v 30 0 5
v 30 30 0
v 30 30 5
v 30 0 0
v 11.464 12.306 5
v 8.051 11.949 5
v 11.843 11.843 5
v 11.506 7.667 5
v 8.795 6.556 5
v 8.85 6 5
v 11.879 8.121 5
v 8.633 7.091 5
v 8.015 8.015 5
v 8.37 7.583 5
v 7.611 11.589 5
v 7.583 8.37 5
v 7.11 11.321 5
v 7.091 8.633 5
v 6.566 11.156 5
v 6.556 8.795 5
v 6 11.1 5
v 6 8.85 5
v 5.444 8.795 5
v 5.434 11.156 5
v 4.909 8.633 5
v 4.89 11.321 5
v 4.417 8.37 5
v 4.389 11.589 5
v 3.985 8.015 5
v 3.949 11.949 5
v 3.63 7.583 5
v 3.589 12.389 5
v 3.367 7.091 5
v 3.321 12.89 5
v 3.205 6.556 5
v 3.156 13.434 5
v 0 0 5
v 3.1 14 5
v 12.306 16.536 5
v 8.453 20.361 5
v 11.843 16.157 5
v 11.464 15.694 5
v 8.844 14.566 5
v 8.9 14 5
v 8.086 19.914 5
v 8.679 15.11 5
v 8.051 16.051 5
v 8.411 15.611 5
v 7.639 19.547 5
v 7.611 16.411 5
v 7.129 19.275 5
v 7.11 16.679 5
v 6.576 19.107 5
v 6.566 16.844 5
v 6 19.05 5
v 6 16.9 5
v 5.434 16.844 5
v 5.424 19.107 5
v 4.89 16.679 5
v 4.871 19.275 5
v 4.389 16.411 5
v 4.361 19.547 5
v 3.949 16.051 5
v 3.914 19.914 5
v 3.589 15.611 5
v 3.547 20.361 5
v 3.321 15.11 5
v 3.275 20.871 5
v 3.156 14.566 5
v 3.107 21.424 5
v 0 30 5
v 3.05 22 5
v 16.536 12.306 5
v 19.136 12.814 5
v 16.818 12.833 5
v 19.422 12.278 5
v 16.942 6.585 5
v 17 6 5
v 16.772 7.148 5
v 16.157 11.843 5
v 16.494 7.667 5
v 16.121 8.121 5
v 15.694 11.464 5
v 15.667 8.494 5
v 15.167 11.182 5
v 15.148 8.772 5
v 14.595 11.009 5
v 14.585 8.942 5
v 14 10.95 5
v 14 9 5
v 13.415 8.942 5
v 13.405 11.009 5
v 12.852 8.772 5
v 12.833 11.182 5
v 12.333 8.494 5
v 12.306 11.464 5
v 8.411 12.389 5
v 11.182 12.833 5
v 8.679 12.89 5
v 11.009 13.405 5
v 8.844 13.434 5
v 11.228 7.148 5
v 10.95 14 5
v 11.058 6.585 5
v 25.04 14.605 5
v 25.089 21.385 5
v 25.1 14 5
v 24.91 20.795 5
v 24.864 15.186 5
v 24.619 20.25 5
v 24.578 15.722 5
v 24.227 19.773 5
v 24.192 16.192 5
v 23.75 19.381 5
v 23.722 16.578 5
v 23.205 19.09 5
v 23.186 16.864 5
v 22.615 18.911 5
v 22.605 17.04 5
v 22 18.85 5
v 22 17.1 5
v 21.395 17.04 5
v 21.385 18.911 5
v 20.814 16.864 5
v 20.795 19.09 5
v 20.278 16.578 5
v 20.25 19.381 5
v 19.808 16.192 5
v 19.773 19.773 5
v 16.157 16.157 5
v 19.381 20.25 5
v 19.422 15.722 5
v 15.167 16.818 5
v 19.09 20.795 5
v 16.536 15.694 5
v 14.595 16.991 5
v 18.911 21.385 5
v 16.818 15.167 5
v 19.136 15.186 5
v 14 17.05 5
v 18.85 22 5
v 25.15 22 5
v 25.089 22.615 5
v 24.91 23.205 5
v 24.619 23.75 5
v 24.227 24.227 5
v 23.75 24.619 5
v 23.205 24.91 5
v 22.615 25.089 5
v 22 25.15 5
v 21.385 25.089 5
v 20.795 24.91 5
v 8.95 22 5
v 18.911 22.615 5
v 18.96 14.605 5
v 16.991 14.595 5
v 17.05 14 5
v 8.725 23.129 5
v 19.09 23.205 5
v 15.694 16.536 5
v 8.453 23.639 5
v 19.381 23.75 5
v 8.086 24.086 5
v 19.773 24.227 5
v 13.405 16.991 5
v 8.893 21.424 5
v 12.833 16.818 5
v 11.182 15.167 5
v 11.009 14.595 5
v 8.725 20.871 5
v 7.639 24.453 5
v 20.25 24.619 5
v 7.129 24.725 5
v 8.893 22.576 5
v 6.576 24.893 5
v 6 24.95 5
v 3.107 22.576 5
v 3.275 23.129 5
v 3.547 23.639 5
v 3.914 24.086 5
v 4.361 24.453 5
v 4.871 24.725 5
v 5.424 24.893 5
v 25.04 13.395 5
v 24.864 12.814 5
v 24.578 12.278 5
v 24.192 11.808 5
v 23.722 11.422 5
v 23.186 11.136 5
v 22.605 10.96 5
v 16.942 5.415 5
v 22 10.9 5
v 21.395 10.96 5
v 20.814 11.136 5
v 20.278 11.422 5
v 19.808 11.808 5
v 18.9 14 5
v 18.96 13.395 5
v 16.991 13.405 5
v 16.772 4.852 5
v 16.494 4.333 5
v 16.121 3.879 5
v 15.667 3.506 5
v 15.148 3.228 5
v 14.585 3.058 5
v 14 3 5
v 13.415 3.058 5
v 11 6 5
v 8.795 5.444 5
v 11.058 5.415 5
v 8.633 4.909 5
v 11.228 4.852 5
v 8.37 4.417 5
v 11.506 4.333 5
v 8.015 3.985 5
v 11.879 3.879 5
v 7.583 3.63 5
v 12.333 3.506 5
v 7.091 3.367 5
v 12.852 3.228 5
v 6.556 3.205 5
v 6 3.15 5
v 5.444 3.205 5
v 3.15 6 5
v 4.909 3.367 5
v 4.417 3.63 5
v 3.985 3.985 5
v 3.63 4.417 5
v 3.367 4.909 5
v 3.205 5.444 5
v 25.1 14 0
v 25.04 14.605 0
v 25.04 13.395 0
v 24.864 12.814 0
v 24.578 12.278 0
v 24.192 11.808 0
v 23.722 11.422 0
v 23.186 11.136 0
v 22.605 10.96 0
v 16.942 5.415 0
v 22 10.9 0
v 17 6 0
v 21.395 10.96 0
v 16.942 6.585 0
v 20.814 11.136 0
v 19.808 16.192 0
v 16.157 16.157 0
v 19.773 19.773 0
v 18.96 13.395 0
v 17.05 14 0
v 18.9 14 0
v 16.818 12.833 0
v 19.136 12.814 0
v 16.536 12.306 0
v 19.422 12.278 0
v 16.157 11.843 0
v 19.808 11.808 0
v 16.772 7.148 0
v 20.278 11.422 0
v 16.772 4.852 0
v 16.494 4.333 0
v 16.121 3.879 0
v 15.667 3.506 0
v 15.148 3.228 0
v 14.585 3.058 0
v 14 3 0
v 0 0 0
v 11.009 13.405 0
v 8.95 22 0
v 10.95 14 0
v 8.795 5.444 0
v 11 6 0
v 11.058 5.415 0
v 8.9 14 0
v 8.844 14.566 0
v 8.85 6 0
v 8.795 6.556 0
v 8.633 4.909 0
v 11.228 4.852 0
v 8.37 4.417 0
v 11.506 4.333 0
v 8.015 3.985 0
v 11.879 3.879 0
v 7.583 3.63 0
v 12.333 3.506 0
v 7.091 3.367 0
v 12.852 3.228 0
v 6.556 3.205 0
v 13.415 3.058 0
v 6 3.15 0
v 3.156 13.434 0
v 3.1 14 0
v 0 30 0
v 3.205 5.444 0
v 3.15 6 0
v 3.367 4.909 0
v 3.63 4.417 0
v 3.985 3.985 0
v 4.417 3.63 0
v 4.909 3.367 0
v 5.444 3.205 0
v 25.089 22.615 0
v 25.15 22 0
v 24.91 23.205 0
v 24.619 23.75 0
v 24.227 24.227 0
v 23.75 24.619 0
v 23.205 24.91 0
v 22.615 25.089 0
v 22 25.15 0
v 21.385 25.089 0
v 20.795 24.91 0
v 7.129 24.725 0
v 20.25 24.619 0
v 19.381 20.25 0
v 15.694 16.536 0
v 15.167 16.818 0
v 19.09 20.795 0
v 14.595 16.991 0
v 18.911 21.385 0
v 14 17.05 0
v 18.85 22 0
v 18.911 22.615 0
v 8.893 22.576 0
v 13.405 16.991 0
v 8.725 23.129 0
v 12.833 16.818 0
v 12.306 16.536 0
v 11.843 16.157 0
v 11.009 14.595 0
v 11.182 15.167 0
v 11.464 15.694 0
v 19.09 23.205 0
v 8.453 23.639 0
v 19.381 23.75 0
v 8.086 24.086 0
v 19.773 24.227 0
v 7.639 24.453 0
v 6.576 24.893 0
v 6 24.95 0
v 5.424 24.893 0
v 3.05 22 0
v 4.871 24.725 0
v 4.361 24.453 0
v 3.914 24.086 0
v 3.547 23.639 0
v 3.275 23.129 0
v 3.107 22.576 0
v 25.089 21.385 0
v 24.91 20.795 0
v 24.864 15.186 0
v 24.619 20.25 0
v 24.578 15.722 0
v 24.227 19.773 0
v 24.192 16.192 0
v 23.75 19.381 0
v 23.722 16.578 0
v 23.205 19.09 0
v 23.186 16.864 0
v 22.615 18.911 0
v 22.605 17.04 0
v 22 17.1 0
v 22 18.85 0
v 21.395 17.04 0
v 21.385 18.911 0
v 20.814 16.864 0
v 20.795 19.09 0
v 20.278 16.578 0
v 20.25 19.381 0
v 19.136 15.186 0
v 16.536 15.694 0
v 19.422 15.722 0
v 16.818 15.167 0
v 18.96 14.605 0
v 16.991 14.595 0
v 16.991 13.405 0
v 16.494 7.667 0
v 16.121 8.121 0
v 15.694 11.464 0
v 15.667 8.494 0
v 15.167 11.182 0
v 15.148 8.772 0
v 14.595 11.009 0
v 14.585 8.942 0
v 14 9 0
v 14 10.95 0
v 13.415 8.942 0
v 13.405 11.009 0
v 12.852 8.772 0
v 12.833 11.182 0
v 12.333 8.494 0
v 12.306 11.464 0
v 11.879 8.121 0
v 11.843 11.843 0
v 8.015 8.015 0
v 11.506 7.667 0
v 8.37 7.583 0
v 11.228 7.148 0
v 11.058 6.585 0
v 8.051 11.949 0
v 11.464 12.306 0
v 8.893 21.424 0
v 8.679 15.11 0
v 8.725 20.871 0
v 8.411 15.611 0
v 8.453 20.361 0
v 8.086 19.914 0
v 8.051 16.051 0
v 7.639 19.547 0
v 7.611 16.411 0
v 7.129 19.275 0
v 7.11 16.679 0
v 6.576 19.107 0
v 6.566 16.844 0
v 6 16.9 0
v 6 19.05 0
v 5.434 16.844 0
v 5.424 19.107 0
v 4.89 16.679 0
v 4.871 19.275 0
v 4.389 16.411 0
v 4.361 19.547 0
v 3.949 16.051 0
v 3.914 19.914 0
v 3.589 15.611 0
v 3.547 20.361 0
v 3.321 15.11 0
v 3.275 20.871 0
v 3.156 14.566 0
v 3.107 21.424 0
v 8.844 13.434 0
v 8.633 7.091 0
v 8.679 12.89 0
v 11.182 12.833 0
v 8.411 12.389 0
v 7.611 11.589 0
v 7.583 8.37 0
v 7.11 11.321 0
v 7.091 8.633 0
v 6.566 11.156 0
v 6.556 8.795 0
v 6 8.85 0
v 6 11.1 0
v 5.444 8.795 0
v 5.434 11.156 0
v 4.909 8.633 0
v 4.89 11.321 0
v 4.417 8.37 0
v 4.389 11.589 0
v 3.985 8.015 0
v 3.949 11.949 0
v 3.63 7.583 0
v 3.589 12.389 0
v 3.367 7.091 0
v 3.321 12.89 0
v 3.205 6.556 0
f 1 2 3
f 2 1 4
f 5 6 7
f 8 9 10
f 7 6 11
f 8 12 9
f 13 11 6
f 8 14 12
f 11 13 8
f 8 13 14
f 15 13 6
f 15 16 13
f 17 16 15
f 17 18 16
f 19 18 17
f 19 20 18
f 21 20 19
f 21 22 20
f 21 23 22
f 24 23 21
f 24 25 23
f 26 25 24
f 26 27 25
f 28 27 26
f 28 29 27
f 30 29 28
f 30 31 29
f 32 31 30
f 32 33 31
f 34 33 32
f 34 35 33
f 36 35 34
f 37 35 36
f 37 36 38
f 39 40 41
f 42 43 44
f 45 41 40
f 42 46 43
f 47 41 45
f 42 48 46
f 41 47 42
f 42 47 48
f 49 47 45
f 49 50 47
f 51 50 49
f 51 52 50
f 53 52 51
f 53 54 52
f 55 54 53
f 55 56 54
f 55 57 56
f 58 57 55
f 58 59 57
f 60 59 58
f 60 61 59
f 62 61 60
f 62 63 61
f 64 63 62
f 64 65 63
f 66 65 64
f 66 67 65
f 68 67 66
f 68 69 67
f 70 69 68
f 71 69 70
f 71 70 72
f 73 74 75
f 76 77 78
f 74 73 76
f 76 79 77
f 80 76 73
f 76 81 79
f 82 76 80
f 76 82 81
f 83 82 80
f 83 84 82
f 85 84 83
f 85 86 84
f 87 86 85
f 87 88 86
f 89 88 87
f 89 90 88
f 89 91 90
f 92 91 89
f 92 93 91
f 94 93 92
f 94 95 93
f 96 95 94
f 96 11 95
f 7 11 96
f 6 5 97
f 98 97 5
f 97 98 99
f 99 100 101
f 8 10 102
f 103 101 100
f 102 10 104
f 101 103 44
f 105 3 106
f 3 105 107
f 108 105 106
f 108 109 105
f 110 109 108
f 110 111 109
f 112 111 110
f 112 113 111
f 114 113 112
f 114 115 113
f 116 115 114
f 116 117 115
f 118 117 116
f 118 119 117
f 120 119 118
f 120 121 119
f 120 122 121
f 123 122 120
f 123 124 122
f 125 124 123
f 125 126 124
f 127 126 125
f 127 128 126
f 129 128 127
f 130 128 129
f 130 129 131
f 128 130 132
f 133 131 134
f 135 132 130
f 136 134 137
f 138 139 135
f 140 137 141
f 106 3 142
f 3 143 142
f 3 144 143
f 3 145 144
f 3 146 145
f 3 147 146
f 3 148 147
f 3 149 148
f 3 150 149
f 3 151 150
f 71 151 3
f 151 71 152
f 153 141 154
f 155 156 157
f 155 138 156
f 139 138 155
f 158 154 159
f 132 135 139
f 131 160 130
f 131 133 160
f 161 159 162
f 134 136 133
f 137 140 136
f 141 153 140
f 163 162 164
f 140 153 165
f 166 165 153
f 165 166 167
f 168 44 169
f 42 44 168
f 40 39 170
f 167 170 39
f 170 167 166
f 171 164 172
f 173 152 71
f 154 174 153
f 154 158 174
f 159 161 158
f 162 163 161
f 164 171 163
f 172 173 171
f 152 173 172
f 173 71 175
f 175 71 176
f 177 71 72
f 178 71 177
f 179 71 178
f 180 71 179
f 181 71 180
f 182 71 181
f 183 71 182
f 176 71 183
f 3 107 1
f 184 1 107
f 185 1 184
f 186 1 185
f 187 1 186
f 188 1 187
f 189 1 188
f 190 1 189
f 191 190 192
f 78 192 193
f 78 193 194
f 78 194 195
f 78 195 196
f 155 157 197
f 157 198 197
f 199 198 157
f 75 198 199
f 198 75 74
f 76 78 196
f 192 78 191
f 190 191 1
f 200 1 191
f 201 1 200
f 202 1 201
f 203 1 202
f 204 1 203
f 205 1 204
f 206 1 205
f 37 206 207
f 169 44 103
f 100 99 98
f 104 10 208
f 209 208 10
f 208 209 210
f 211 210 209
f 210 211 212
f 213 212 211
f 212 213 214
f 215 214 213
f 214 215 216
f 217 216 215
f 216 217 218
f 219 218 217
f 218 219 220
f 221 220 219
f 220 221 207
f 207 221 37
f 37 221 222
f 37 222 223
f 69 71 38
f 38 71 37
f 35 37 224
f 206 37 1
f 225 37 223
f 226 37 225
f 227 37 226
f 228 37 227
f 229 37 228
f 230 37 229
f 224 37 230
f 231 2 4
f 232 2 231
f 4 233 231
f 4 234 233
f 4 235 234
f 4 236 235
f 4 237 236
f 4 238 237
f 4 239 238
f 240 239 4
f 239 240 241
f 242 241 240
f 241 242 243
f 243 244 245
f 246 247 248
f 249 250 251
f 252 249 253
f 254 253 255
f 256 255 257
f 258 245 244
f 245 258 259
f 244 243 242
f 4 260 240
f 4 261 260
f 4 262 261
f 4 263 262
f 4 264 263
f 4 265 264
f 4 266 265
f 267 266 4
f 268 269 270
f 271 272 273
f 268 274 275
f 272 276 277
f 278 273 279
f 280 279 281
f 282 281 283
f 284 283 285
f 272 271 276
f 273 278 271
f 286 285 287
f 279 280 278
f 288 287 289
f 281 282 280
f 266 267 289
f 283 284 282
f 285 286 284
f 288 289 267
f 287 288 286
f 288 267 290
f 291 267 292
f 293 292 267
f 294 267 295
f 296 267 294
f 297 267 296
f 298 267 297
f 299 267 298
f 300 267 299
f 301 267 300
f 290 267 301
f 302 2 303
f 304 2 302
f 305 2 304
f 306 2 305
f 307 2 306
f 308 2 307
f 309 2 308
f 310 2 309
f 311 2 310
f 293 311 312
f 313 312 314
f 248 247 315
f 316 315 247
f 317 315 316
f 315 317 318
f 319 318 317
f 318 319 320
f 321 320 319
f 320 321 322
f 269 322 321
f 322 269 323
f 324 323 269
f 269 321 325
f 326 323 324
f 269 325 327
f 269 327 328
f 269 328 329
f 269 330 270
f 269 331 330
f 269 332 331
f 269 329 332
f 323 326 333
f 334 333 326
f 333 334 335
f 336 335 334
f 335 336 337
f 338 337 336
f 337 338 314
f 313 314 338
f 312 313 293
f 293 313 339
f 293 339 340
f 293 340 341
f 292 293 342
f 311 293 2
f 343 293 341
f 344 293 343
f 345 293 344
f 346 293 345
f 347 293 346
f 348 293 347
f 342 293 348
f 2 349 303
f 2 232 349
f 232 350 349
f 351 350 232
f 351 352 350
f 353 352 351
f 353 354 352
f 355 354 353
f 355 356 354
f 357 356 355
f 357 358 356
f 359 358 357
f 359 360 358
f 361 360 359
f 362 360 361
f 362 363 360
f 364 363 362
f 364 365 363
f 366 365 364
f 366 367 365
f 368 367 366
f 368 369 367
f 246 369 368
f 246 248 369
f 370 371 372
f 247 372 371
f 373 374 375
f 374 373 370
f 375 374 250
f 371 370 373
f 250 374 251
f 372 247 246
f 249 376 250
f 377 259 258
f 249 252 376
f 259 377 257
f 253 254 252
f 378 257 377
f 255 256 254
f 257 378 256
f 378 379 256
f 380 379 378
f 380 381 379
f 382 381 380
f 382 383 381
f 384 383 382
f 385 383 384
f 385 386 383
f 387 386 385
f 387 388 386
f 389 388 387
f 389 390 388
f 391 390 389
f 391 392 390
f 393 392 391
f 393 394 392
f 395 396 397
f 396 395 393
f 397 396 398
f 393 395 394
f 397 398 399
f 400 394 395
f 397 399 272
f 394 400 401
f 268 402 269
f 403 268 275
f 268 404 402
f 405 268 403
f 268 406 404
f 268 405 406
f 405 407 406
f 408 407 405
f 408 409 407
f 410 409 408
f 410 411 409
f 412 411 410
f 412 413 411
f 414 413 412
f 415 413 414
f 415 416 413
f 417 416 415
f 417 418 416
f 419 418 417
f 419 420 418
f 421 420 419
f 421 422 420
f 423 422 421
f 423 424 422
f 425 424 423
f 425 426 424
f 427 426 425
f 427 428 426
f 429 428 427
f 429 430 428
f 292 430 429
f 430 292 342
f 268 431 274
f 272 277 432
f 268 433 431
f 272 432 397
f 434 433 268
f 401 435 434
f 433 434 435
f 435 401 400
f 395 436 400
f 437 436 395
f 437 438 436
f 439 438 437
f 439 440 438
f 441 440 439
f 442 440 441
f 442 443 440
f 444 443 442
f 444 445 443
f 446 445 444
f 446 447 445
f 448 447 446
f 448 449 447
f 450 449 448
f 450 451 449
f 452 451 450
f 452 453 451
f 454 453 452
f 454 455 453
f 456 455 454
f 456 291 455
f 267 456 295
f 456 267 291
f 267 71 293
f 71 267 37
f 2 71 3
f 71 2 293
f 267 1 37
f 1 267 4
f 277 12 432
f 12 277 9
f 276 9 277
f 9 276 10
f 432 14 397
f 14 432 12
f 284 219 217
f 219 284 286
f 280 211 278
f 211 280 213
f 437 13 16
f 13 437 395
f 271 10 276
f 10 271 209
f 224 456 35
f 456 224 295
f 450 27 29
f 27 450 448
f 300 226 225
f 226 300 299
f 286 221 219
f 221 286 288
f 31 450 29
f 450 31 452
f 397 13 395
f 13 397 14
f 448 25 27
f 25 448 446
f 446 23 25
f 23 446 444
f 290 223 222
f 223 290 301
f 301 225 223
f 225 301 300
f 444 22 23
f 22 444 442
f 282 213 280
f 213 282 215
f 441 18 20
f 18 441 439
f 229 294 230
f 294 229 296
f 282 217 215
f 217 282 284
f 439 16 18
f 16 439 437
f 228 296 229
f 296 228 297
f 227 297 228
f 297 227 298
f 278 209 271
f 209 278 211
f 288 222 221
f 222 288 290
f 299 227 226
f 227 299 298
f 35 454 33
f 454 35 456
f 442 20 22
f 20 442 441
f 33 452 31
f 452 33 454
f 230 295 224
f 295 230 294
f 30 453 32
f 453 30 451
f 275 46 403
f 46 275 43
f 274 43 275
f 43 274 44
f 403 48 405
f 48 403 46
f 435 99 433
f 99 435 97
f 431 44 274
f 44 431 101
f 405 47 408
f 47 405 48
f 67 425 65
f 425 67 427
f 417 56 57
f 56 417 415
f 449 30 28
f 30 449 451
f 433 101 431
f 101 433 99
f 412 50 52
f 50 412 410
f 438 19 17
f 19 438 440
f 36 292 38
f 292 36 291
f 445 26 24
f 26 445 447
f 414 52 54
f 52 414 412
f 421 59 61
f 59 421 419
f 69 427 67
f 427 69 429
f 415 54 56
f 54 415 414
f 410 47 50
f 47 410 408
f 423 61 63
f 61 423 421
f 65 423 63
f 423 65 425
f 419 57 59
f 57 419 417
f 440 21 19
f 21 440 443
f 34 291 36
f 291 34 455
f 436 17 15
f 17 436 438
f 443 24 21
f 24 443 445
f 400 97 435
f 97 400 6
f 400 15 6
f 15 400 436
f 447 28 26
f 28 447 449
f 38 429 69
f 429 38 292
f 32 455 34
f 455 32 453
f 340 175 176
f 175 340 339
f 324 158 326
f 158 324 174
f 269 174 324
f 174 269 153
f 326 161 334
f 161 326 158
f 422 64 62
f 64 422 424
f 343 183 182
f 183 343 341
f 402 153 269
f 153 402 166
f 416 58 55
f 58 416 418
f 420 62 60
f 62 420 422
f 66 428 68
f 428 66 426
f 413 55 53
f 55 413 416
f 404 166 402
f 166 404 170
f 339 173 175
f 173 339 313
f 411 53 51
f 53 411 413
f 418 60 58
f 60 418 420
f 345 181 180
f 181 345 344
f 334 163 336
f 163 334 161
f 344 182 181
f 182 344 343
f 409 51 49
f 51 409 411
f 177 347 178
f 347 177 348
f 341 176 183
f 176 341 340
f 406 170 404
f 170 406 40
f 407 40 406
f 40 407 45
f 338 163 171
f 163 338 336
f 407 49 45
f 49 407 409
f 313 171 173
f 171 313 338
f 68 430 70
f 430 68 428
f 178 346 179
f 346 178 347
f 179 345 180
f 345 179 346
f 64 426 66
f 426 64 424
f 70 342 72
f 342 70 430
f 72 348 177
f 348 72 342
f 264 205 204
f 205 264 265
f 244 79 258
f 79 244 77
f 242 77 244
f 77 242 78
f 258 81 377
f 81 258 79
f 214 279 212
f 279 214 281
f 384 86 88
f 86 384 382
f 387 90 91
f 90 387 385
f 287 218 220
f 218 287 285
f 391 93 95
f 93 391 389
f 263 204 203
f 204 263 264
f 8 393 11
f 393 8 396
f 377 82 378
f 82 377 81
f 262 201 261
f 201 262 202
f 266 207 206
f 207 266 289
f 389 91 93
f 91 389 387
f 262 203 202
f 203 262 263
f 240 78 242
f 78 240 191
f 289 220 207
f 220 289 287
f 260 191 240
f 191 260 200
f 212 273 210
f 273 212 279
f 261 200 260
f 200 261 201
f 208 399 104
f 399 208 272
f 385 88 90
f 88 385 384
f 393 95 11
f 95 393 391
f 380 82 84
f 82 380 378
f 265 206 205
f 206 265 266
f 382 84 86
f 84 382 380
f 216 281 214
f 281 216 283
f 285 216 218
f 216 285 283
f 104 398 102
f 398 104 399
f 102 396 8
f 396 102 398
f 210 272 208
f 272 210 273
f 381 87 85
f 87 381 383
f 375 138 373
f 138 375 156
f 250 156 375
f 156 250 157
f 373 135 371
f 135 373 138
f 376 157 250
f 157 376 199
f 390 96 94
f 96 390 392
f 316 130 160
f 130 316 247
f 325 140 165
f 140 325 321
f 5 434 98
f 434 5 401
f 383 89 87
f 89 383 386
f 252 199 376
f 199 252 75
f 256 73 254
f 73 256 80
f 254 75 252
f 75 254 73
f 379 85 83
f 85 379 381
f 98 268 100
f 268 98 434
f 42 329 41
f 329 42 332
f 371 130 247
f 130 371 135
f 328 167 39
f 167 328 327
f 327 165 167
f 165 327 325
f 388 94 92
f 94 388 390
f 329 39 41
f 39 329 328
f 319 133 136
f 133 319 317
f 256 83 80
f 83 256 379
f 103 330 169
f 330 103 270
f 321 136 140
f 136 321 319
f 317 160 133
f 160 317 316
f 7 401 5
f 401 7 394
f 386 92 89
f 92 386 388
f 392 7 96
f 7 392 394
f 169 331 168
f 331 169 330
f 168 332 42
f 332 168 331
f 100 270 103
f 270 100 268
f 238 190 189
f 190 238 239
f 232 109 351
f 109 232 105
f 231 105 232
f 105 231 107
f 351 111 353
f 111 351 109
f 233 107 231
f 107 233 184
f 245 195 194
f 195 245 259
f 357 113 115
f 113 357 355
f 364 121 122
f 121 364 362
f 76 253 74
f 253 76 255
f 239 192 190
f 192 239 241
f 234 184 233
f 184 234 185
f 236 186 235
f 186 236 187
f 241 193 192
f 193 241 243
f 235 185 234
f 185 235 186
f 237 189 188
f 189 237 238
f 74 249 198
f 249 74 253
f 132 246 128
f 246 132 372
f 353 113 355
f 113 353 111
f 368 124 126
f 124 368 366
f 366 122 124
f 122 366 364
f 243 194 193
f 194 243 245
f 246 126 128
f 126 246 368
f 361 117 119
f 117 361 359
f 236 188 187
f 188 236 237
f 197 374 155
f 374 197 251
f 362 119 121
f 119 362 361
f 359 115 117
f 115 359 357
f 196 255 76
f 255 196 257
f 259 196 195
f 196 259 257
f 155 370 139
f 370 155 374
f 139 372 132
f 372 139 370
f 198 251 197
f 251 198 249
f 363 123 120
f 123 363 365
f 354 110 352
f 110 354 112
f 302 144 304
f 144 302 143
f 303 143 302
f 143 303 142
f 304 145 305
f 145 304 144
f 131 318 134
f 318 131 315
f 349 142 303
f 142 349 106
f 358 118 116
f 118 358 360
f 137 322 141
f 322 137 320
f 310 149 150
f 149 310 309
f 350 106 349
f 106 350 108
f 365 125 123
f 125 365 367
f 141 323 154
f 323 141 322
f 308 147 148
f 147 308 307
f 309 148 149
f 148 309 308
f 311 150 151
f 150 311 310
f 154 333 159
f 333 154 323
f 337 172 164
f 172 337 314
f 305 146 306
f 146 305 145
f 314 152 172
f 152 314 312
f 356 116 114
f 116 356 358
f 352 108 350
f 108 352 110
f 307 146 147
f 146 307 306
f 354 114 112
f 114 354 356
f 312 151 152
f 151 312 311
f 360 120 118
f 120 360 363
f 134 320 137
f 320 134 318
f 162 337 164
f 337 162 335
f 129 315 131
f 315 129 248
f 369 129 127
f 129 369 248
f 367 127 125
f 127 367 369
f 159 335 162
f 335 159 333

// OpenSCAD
difference() {
    cube([30, 30, 5]);
    translate([ 6, 6,-2.5]) cylinder(10, 5.7 / 2, 5.7 / 2, $fn=32);
    translate([ 6,14,-2.5]) cylinder(10, 5.8 / 2, 5.8 / 2, $fn=32);
    translate([ 6,22,-2.5]) cylinder(10, 5.9 / 2, 5.9 / 2, $fn=32);
    translate([14, 6,-2.5]) cylinder(10, 6.0 / 2, 6.0 / 2, $fn=32);
    translate([14,14,-2.5]) cylinder(10, 6.1 / 2, 6.1 / 2, $fn=32);
    translate([22,14,-2.5]) cylinder(10, 6.2 / 2, 6.2 / 2, $fn=32);
    translate([22,22,-2.5]) cylinder(10, 6.3 / 2, 6.3 / 2, $fn=32);
}
